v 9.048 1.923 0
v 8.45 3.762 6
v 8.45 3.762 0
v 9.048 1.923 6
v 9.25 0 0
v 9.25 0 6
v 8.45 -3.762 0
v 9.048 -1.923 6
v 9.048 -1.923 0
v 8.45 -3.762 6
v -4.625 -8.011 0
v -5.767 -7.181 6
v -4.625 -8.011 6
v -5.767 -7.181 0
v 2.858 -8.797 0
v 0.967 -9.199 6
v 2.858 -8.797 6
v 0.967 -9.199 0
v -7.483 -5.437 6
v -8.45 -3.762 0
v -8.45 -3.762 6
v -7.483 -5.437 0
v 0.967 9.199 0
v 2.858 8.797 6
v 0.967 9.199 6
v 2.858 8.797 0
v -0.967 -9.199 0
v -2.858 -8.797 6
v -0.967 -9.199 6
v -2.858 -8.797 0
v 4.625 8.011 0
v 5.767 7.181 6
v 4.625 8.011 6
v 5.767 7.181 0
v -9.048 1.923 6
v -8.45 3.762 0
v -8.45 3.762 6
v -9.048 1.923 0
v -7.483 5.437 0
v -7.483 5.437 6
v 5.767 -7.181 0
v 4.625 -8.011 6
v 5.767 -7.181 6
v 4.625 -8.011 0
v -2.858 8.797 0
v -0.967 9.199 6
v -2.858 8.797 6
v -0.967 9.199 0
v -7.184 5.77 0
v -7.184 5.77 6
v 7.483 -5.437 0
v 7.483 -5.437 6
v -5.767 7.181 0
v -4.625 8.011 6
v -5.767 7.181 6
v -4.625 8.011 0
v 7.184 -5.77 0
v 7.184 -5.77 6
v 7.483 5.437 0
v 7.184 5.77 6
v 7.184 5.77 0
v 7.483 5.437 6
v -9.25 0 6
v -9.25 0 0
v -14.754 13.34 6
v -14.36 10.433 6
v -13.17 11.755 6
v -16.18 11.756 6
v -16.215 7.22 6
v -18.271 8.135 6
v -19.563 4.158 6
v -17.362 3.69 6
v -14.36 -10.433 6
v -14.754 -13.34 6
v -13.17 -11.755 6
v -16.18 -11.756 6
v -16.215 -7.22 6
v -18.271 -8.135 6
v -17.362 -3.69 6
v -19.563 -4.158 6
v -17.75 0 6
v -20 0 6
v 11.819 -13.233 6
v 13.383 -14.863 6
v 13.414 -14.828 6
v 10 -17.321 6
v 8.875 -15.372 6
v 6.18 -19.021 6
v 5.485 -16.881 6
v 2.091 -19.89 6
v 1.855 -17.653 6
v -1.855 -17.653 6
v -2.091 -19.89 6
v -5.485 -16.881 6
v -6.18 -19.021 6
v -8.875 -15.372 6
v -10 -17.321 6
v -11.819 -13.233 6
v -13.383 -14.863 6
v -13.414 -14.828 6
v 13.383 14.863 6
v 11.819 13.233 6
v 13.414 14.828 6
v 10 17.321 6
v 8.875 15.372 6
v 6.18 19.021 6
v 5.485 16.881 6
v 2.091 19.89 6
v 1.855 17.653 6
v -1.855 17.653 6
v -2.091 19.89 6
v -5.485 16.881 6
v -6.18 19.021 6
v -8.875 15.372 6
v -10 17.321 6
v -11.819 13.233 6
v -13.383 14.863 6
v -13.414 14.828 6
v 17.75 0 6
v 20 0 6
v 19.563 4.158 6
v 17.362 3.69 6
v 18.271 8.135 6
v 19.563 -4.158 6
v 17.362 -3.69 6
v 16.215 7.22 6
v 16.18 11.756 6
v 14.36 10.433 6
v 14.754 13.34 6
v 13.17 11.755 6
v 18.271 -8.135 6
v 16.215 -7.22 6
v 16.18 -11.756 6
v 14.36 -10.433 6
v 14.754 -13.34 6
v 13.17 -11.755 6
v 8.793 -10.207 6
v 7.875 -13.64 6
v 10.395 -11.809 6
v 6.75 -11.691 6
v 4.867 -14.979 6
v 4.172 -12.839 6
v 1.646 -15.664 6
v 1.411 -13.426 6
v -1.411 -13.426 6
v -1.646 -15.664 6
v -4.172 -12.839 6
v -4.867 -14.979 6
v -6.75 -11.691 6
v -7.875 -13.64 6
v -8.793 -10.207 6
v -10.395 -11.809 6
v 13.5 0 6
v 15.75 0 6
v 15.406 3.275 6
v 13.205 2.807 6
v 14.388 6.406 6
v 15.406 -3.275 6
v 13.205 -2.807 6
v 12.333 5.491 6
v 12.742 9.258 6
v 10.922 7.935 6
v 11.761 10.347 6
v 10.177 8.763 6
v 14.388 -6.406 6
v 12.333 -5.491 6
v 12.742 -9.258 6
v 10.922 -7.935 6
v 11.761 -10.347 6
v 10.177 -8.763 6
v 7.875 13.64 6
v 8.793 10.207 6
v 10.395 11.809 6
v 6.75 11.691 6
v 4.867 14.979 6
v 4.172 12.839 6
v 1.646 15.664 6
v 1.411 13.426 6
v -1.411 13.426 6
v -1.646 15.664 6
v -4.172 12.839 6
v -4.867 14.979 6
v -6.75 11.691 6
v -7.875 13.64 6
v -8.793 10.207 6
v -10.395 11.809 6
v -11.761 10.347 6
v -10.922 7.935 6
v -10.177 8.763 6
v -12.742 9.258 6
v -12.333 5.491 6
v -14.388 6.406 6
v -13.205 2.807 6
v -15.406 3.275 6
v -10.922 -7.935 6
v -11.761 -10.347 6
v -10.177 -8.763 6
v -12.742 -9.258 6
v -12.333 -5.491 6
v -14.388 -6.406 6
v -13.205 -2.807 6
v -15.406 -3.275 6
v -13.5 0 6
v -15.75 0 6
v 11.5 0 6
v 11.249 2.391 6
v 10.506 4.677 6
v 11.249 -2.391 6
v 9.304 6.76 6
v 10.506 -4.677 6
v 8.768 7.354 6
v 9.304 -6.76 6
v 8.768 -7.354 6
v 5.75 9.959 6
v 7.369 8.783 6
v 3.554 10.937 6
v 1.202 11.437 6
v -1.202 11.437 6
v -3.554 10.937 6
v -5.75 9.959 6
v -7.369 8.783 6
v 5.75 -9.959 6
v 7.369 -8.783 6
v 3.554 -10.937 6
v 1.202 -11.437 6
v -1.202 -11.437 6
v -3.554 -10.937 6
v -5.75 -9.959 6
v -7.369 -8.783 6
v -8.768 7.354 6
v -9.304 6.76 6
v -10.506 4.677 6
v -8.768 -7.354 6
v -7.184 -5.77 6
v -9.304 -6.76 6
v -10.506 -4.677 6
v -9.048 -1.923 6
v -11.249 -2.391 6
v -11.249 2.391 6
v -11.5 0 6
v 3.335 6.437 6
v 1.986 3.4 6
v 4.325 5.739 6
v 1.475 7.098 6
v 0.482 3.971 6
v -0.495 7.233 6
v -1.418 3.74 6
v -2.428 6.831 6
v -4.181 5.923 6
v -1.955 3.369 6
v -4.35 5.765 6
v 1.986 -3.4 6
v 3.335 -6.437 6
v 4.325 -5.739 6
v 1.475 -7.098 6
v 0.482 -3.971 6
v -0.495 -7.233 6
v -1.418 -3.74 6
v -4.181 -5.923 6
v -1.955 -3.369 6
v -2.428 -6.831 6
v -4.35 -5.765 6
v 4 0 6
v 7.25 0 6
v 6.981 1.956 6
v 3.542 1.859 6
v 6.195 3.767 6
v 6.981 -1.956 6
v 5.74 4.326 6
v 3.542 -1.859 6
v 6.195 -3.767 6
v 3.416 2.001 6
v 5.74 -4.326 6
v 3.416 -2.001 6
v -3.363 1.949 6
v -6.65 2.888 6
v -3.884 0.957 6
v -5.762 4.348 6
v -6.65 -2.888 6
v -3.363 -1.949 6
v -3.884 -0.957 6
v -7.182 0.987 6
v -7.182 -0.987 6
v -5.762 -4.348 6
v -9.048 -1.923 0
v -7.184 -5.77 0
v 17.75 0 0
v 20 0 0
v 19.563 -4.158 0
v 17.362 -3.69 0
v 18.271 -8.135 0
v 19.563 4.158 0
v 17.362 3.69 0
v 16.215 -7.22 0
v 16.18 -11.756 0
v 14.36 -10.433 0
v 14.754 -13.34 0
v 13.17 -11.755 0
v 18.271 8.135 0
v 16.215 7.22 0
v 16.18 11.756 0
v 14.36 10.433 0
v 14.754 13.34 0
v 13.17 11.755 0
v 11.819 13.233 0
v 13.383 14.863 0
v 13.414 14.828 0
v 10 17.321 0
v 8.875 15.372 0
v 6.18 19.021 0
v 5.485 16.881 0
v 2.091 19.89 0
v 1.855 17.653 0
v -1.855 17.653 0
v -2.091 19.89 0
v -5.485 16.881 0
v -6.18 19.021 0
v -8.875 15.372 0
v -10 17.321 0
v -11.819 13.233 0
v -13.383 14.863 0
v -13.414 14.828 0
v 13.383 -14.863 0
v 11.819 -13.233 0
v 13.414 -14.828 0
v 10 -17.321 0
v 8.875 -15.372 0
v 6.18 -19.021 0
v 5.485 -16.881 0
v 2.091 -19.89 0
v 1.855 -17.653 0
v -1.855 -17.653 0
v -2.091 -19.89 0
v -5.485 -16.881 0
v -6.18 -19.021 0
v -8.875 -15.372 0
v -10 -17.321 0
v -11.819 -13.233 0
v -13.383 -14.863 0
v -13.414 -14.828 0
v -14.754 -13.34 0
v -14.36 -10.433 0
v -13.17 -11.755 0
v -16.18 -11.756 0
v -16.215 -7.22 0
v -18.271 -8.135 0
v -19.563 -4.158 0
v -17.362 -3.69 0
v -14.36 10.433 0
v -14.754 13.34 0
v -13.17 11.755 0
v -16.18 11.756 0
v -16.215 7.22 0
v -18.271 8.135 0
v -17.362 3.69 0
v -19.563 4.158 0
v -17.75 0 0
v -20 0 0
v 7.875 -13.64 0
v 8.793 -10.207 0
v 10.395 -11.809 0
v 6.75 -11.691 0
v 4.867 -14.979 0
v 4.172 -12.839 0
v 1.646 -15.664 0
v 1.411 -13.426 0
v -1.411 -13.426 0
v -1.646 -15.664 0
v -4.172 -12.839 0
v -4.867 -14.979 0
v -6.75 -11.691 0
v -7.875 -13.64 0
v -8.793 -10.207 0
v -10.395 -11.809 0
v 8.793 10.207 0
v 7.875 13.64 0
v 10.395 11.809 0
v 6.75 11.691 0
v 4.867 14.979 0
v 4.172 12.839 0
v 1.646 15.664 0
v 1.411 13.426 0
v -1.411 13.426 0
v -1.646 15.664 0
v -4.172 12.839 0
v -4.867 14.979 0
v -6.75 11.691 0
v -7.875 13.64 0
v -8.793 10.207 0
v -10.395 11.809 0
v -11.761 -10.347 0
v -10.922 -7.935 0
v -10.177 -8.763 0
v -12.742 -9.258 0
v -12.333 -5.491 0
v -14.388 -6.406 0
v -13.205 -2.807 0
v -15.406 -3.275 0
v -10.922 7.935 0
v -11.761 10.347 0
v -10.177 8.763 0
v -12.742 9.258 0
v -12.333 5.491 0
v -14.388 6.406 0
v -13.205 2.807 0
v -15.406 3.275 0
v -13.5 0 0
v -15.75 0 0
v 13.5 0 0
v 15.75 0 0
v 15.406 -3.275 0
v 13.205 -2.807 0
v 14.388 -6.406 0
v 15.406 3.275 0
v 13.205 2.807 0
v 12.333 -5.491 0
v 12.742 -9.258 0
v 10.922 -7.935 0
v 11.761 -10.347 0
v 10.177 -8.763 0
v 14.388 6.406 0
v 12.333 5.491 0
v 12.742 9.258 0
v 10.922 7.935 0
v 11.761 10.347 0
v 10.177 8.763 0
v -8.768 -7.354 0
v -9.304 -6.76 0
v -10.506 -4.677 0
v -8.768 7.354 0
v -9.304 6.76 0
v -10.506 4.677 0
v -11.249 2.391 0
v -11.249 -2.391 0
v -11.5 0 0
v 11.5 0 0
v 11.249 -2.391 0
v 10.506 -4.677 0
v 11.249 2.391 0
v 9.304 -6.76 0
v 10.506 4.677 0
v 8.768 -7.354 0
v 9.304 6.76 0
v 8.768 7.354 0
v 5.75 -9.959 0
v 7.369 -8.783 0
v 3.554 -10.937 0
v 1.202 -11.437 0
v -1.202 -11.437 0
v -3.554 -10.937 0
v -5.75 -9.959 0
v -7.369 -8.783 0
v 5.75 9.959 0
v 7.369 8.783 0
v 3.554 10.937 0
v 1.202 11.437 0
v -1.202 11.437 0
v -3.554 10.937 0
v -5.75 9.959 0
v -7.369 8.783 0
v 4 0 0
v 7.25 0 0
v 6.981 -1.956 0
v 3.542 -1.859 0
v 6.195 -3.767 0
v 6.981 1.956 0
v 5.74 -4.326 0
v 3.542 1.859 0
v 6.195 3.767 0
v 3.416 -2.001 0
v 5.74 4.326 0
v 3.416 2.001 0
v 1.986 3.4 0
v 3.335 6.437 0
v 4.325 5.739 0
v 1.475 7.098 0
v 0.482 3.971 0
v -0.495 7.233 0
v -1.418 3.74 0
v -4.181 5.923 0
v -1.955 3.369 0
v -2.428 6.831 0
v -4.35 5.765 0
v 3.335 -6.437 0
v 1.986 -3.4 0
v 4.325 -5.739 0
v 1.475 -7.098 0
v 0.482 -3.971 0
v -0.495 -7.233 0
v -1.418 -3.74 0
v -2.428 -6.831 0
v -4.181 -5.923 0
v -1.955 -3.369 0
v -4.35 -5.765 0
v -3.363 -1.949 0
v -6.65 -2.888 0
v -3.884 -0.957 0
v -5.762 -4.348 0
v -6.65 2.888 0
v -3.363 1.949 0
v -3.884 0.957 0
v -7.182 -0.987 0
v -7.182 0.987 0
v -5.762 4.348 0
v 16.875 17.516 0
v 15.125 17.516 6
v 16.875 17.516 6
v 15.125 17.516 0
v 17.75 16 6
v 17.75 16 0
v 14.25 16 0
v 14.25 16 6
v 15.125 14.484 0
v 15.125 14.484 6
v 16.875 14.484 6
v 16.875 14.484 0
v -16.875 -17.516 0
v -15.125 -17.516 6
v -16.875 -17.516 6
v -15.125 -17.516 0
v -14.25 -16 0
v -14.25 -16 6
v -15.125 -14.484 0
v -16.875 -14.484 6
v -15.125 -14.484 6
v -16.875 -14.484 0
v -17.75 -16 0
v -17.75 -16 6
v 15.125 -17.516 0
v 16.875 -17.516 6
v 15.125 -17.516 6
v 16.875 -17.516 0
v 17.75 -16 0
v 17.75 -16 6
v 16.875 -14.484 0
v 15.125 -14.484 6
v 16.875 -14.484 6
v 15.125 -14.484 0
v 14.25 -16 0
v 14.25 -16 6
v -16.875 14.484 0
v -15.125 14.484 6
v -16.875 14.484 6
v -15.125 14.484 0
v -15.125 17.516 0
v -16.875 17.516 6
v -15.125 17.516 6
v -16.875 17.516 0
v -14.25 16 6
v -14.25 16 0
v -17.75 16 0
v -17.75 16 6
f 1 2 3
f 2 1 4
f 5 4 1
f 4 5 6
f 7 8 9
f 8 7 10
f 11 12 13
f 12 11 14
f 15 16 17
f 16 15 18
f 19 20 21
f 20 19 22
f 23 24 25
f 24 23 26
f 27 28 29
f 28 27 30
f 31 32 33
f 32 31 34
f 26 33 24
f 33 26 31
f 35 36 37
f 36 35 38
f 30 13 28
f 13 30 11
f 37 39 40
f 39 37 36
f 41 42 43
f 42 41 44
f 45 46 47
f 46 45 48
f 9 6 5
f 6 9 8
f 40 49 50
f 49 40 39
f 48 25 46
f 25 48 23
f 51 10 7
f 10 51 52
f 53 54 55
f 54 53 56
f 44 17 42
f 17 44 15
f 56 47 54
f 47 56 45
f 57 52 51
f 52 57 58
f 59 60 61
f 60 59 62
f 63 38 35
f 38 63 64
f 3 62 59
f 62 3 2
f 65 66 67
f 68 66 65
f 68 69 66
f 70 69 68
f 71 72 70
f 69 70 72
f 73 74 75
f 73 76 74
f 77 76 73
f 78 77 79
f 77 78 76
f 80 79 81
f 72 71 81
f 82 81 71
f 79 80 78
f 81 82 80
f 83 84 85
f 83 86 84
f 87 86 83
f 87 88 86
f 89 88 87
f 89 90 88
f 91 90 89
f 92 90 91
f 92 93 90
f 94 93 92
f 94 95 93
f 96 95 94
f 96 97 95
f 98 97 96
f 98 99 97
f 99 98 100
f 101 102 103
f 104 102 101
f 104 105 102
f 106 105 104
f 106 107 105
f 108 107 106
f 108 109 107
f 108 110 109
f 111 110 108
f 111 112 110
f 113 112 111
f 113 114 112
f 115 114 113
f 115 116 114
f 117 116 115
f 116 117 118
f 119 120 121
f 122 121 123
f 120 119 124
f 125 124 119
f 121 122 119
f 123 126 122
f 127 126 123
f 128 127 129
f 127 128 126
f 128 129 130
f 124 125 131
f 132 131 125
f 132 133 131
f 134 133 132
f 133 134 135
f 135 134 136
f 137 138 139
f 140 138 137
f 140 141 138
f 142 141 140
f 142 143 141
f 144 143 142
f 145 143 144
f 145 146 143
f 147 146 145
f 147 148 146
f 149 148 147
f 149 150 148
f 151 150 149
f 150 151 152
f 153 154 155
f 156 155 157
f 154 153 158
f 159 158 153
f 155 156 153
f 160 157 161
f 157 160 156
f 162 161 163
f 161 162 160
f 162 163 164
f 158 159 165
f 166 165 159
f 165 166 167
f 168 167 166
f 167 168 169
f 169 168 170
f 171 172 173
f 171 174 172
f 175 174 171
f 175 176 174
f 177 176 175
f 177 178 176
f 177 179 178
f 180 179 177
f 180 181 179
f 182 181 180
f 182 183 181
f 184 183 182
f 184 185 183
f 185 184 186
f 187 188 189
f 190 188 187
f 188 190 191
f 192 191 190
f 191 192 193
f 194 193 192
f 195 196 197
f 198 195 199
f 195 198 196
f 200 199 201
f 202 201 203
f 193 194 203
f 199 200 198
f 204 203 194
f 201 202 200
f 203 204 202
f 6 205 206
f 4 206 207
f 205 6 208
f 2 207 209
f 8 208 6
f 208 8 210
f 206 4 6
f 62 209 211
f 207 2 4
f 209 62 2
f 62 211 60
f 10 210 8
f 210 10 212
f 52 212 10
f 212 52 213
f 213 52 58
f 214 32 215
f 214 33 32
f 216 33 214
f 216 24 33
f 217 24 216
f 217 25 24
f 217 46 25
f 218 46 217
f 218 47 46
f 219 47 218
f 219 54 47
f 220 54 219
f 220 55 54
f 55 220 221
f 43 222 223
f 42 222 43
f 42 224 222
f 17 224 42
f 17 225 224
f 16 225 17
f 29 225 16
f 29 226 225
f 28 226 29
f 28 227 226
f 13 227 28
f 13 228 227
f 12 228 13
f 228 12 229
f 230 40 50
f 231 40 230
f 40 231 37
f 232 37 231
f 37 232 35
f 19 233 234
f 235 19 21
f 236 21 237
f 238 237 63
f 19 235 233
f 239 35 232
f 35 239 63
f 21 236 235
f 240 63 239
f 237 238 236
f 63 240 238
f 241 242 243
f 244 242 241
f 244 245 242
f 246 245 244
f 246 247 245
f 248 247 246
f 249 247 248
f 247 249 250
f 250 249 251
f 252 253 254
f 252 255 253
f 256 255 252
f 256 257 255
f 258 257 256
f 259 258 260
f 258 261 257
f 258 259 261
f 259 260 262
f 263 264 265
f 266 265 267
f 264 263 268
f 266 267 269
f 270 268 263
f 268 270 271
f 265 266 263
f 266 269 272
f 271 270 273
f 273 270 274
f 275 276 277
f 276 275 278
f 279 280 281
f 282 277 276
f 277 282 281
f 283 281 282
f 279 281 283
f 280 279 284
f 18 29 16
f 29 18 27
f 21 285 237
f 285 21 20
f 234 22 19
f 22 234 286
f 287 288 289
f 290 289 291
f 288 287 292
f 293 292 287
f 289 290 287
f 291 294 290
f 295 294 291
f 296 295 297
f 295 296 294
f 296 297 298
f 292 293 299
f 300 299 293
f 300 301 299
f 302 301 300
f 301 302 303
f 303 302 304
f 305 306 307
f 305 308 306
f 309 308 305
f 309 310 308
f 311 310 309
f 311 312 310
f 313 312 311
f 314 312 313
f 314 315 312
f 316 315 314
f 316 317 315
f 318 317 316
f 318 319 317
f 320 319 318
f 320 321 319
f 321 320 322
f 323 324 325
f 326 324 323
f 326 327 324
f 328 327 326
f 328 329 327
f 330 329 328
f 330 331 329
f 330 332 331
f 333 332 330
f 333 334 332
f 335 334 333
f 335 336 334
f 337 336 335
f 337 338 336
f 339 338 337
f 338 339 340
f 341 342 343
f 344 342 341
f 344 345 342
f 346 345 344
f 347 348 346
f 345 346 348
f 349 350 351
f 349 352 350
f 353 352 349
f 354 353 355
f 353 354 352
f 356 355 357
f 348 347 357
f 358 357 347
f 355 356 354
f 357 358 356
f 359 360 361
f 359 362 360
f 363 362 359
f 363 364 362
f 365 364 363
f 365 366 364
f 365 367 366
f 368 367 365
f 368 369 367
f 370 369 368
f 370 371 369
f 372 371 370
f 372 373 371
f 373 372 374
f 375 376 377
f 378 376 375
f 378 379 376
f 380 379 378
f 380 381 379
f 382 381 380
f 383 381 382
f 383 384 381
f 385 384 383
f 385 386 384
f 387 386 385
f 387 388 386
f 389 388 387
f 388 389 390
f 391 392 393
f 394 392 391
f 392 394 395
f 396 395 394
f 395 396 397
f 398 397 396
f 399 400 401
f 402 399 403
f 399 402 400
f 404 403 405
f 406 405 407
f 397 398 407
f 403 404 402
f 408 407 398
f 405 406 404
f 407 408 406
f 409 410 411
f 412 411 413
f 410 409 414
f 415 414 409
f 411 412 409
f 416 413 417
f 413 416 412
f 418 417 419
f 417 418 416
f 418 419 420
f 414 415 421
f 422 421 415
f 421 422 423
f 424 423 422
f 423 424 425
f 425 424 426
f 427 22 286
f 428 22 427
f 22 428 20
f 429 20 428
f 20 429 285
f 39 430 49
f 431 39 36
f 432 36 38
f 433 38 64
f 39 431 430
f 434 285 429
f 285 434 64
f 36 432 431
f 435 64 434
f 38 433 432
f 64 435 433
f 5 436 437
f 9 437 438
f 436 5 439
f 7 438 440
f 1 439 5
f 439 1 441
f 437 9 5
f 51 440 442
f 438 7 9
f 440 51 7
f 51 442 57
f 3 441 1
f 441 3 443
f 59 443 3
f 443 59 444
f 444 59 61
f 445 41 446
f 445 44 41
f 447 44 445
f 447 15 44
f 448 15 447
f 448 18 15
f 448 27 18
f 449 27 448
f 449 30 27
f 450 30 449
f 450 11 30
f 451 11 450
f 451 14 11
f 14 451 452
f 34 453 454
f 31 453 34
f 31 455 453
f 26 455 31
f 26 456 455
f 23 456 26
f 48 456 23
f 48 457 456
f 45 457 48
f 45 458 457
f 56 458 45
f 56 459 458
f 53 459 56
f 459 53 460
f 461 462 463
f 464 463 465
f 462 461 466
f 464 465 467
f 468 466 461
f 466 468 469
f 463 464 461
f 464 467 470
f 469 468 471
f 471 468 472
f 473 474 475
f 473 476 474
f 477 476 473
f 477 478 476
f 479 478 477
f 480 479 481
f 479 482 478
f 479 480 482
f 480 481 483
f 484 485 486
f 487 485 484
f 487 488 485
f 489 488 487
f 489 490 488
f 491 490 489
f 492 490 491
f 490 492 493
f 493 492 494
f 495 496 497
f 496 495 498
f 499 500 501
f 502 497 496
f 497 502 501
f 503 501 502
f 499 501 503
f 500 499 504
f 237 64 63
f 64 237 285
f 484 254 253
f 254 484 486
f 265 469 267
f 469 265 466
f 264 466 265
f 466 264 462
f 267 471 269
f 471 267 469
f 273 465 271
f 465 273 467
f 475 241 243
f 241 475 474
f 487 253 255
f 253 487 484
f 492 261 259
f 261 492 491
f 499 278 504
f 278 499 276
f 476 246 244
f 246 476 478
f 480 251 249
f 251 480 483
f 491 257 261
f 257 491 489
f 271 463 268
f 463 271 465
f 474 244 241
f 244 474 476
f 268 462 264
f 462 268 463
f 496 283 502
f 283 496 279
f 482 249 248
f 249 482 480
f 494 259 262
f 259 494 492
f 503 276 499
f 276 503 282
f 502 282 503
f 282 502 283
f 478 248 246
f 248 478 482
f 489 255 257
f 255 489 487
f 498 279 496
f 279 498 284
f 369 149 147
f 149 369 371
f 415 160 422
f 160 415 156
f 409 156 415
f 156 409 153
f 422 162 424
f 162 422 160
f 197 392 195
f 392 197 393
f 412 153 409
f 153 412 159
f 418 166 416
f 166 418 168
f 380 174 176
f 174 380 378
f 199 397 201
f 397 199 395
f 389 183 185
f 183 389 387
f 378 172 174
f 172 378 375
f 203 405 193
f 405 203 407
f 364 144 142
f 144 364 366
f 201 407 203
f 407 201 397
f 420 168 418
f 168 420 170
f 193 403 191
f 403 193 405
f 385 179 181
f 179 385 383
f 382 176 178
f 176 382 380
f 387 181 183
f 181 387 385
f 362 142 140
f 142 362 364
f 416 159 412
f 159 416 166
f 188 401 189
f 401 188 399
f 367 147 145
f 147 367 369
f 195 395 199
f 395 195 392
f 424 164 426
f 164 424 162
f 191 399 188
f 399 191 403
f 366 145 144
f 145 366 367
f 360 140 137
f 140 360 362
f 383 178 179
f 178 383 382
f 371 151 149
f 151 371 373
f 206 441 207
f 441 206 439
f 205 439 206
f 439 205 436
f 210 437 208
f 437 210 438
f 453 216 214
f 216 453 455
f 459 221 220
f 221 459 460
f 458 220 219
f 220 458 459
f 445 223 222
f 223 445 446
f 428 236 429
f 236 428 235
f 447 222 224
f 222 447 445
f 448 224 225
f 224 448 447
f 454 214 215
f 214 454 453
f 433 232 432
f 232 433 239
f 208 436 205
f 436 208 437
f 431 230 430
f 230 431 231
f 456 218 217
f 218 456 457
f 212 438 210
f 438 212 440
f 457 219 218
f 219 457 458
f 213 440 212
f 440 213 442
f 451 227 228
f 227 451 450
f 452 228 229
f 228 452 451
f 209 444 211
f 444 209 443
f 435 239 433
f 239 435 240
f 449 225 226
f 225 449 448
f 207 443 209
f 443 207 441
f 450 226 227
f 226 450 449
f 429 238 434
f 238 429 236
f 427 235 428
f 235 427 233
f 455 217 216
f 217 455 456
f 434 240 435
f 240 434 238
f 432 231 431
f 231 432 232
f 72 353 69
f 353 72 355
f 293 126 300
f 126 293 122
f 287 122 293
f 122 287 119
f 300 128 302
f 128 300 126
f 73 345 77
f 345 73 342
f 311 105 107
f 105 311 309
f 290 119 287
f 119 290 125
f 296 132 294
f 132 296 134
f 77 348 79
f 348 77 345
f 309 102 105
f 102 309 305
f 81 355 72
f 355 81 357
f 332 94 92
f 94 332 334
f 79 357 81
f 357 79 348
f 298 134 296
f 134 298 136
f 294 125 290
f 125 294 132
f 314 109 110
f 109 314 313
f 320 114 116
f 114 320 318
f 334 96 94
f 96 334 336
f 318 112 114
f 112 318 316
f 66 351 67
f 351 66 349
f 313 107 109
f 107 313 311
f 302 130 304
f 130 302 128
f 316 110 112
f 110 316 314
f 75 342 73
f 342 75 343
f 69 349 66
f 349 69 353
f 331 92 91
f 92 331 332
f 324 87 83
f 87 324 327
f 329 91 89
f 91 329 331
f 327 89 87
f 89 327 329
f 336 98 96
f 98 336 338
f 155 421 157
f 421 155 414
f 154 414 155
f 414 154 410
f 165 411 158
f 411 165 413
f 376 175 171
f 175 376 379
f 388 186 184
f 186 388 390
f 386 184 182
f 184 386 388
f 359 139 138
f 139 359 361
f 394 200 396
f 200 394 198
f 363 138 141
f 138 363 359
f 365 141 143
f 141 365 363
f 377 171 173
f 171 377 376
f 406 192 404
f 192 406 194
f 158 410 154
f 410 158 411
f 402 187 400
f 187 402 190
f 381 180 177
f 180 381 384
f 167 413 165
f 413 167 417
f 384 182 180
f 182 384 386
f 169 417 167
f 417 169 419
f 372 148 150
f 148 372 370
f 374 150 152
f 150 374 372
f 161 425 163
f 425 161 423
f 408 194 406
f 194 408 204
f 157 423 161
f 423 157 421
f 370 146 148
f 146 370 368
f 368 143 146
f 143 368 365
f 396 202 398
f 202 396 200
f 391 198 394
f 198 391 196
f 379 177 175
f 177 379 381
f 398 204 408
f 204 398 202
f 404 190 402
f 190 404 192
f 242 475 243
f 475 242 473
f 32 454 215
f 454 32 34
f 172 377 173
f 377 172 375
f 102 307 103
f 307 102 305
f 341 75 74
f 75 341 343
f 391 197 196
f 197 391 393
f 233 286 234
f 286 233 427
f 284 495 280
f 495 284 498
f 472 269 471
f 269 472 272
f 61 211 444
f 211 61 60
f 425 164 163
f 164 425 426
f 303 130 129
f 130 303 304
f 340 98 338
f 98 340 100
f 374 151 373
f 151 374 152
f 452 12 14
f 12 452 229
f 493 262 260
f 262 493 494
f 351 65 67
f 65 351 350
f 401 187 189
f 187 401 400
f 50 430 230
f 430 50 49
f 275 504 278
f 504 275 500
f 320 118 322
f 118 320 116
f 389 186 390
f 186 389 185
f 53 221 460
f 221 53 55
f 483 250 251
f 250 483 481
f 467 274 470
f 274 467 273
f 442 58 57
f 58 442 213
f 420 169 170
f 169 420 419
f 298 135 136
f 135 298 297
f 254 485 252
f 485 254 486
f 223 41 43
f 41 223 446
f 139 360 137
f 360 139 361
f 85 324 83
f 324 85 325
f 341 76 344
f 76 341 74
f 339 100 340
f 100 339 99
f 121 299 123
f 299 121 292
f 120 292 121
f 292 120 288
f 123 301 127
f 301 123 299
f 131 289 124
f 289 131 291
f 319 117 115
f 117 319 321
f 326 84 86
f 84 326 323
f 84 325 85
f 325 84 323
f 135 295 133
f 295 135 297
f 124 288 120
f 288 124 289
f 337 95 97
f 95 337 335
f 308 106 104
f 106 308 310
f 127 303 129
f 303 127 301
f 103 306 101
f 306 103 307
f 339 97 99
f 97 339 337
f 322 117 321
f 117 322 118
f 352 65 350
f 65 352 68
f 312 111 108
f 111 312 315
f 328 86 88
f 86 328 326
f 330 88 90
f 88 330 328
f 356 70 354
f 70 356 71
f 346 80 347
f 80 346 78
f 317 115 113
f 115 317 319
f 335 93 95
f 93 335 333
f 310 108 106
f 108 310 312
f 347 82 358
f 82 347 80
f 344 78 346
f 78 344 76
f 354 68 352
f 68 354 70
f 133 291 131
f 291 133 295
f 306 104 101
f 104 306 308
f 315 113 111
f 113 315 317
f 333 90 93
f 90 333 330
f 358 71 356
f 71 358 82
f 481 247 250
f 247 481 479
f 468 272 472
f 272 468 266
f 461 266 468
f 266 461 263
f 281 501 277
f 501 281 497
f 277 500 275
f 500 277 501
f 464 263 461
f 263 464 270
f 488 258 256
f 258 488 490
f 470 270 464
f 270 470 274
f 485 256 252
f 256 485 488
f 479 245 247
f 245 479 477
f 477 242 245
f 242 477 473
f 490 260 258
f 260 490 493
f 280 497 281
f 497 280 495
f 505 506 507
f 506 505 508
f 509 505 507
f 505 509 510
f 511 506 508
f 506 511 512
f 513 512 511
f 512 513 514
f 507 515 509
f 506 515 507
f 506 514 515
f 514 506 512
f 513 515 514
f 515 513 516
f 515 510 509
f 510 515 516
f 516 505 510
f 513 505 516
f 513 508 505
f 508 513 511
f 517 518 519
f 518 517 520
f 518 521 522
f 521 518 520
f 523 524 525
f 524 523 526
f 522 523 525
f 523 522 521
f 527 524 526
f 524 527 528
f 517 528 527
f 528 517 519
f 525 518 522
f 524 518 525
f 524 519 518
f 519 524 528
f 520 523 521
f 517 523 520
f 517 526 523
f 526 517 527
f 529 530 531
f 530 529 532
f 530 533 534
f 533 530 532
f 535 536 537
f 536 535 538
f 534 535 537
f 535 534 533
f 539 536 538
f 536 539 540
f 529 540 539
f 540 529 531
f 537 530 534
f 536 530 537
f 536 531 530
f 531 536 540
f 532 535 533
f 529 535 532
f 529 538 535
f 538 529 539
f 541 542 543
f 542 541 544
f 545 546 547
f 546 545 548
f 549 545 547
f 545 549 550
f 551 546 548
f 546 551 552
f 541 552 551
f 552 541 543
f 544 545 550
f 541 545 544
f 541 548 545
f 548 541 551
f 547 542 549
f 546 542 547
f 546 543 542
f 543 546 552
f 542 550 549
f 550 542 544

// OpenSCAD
fan_grill_difference(hole_spacing=32,hole_size = 3.5,outer_circle_diameter = 40,inner_circle_diameter = 8 ,outer_thickness = 6);

module fan_grill_difference(hole_spacing ,hole_size ,outer_circle_diameter ,inner_circle_diameter,outer_thickness)
{
vane_count = 4;			
vane_width = 2;
ring_count = 3;
ring_width = 2;

// some calculated values
vane_angle = 360 / vane_count ;
// ring_spacing defines the CENTER of each ring (radius)
ring_spacing = (outer_circle_diameter - inner_circle_diameter+ring_width)/(ring_count+1)/2;

		// cut the screw holes
		translate(v=[hole_spacing/2, hole_spacing/2, 0])
			cylinder(h=outer_thickness, r=hole_size/2);
		translate(v=[-hole_spacing/2,- hole_spacing/2, 0])
			cylinder(h=outer_thickness, r=hole_size/2);
		translate(v=[hole_spacing/2,- hole_spacing/2, 0])
			cylinder(h=outer_thickness, r=hole_size/2);
		translate(v=[-hole_spacing/2, hole_spacing/2, 0])
			cylinder(h=outer_thickness, r=hole_size/2);


difference()
	{ 
	    cylinder(h=outer_thickness, r=outer_circle_diameter/2);
		// circles
		for (x = [1 : ring_count ])
		{
			difference()
			{
				cylinder(h=outer_thickness, r=inner_circle_diameter/2 + (ring_spacing * x) + (ring_width/2));
				cylinder(h=outer_thickness, r=inner_circle_diameter/2 + (ring_spacing * x) - (ring_width/2));
			}
		}
		// the inner circle
		cylinder(h=outer_thickness, r=inner_circle_diameter/2);
		// diagonal holders
		rotate([0,0,vane_angle/2])
	for (angle = [0 : vane_angle : 360] )
	{
		rotate([0,0,angle])
		translate(v=[0,-vane_width/2,0])
		cube(size=[outer_circle_diameter/2, vane_width, outer_thickness]);
	}
	}







	
	






	
	
	}
